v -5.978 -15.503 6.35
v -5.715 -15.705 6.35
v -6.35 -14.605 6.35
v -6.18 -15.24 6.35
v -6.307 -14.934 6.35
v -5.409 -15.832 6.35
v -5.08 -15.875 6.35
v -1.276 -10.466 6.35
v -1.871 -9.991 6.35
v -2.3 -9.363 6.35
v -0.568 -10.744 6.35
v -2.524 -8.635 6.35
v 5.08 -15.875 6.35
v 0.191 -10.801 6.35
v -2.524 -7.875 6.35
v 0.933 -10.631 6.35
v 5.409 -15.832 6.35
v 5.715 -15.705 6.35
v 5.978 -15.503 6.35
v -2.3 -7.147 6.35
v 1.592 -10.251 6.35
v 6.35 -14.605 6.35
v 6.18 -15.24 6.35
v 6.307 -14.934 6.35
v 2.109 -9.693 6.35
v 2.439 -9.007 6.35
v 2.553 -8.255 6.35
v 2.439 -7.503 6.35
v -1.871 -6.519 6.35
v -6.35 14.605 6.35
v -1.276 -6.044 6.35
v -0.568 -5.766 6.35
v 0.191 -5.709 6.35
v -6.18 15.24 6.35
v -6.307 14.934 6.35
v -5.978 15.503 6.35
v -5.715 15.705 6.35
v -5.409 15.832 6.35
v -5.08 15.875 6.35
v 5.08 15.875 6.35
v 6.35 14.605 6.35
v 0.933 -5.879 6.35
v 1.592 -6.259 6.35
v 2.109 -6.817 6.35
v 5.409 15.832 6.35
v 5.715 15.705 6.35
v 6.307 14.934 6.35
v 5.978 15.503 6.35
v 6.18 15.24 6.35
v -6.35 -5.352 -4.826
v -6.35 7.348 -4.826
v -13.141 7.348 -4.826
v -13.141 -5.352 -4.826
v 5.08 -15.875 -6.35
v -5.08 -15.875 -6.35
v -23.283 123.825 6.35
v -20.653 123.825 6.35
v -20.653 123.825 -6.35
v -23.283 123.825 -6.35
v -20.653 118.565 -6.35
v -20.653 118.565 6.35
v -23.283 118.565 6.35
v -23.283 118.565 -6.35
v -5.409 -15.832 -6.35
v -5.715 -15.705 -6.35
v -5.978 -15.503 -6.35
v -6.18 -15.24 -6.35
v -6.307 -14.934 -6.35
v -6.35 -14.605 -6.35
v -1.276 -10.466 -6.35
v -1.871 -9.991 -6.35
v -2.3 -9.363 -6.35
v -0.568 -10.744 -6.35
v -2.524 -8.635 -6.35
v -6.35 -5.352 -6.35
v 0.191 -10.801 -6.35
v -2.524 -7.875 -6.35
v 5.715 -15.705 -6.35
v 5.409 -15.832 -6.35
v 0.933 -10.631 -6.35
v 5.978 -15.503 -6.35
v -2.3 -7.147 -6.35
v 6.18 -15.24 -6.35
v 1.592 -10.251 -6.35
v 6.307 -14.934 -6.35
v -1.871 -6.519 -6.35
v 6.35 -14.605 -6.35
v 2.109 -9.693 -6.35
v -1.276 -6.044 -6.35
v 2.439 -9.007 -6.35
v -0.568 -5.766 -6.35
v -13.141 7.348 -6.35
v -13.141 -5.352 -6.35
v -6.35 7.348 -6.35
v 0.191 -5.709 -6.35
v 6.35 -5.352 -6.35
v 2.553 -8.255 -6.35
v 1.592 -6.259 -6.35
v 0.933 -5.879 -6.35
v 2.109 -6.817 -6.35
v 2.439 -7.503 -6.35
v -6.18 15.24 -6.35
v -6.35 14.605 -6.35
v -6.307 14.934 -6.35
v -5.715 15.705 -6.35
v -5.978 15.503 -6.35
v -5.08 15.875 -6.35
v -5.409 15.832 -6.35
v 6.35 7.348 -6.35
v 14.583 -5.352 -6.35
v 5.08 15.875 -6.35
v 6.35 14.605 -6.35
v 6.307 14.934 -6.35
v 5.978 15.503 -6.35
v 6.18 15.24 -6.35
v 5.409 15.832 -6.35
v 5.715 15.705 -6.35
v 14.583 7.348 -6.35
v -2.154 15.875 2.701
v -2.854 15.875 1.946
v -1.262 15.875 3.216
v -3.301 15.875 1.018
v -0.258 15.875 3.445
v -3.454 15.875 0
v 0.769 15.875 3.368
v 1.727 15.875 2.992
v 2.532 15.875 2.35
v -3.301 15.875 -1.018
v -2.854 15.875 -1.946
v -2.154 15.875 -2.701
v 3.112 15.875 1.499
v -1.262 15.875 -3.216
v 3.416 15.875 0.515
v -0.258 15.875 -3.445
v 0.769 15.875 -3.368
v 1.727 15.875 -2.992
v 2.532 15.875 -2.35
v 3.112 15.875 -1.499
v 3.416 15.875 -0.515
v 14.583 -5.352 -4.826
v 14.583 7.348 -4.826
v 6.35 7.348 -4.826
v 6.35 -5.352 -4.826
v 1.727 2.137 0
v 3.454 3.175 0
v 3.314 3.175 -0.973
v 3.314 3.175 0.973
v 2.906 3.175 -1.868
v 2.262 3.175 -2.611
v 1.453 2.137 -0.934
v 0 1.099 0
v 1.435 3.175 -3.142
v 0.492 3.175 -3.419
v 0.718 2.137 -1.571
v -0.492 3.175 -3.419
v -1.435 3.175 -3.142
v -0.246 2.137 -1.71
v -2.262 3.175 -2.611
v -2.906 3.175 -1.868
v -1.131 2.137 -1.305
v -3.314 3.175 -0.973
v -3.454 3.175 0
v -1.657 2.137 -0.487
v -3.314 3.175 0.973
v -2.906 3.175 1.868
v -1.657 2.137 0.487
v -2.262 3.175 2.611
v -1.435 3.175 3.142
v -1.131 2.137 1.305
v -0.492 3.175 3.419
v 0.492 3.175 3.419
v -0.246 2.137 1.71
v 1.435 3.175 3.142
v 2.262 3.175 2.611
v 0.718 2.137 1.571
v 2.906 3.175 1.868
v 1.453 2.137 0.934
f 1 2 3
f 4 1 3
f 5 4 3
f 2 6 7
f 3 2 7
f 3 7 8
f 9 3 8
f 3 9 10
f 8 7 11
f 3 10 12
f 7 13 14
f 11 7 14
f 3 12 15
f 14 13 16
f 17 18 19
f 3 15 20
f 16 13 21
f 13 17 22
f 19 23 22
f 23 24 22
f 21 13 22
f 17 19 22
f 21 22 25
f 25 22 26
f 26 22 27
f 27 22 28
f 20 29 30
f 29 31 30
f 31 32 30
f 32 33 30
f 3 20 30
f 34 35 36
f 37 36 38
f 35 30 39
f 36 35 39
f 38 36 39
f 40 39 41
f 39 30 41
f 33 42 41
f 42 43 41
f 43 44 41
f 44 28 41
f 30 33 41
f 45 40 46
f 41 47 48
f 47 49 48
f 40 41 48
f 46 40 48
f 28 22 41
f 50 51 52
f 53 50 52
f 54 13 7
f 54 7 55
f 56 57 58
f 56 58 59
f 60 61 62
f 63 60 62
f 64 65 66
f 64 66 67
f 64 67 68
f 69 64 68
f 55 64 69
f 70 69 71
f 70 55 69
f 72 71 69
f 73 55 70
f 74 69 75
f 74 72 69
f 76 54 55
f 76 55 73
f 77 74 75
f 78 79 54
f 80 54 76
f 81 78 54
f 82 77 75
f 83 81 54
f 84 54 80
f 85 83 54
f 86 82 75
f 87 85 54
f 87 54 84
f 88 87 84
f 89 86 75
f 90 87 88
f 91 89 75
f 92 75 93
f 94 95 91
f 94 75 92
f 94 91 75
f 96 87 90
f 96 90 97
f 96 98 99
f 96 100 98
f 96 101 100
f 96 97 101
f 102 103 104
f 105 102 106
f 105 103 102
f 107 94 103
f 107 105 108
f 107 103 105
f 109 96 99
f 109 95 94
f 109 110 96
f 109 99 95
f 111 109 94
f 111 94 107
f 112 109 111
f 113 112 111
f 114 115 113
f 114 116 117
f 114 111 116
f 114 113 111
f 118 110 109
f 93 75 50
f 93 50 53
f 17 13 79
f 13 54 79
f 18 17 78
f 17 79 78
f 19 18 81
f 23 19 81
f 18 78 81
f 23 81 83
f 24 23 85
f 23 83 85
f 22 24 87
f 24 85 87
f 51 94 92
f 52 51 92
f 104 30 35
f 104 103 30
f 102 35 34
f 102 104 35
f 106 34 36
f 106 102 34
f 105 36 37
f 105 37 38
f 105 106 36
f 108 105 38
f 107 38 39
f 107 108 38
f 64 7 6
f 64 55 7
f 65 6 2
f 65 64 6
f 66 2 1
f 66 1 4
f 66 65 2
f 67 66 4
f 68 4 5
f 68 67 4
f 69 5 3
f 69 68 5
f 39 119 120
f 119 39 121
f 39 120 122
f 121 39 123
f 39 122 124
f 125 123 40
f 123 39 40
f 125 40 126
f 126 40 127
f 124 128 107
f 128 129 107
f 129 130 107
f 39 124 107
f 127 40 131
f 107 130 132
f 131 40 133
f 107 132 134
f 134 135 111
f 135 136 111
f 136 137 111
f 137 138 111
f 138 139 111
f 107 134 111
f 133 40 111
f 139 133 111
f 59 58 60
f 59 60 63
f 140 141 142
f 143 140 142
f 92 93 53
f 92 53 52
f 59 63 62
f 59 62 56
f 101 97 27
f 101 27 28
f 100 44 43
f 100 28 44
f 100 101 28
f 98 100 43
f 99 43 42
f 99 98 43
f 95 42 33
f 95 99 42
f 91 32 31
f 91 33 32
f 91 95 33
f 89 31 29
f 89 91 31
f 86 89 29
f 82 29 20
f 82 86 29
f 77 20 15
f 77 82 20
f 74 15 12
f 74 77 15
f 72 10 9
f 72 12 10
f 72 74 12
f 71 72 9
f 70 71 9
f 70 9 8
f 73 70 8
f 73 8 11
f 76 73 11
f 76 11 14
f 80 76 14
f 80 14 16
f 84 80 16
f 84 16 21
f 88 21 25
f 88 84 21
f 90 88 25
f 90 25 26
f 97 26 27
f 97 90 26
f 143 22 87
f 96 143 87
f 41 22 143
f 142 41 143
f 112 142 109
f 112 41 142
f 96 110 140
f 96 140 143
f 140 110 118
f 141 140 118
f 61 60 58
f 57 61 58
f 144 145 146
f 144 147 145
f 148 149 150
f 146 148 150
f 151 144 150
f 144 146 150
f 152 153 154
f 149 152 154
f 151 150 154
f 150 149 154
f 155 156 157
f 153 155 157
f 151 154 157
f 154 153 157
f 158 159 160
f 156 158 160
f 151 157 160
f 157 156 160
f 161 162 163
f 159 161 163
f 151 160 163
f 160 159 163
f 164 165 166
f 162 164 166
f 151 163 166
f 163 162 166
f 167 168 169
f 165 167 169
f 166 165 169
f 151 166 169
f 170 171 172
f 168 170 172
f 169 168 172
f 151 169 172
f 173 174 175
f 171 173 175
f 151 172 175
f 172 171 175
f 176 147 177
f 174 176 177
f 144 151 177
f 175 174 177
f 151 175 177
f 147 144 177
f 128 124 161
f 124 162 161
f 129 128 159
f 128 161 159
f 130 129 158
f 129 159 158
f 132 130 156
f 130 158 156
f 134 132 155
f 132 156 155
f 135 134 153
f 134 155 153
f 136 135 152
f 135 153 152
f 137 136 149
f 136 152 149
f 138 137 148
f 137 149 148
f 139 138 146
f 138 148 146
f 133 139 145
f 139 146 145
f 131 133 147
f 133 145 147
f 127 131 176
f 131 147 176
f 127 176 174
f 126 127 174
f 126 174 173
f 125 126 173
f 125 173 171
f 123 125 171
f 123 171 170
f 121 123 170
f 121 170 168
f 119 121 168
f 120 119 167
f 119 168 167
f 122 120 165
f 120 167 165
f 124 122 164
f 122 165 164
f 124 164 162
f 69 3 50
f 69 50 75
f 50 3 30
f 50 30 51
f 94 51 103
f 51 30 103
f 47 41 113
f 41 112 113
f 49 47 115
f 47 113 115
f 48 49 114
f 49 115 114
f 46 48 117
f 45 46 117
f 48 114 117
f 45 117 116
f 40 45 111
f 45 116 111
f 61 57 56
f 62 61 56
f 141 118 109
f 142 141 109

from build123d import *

# Parameters (mm, degrees)
SKETCH1_W                    = 12.7
SKETCH1_H                    = 31.75
BOSS_EXTRUDE1_DEPTH          = 6.35
F_5_16_24_TAPPED_HOLE1_D     = 6.9088
F_5_16_24_TAPPED_HOLE1_DEPTH = 12.7
F_5_16_24_TAPPED_HOLE1_TIP   = 2.075612922
CUT_EXTRUDE1_DEPTH           = 22.298547486
CUT_EXTRUDE1_DEPTH_BACK      = 22.298547486
SKETCH8_R                    = 2.5527
SKETCH13_W                   = 2.629886975
SKETCH13_H                   = 5.259773951
BOSS_EXTRUDE2_DEPTH          = 12.7
SKETCH14_W                   = 6.790912291
SKETCH14_H                   = 12.7
SKETCH14_W_2                 = 8.232513551
BOSS_EXTRUDE3_DEPTH          = 1.524
FILLET1_R                    = 1.27


with BuildPart() as part:
    # Sketch1 → Boss-Extrude1 (new, symmetric)
    with BuildSketch(Plane(origin=(0, 0, 0), x_dir=(0, 0, -1), z_dir=(1, 0, 0))):
        Rectangle(SKETCH1_W, SKETCH1_H)
    extrude(amount=BOSS_EXTRUDE1_DEPTH, both=True)

    # 5/16-24 Tapped Hole1
    with Locations(Plane(origin=(0, 15.875, 0), x_dir=(1, 0, 0), z_dir=(0, 1, 0))):
        with Locations((0, 0)):
            Hole(F_5_16_24_TAPPED_HOLE1_D / 2, depth=F_5_16_24_TAPPED_HOLE1_DEPTH)
            with Locations((0, 0, -(F_5_16_24_TAPPED_HOLE1_DEPTH + F_5_16_24_TAPPED_HOLE1_TIP / 2))):  # 118° drill point
                Cone(0, F_5_16_24_TAPPED_HOLE1_D / 2, F_5_16_24_TAPPED_HOLE1_TIP, mode=Mode.SUBTRACT)

    # Sketch8 → Cut-Extrude1 (cut, two sides: drawn at the far end of the back side and taken through both)
    with BuildSketch(Plane.XY.offset(6.35).offset(-CUT_EXTRUDE1_DEPTH_BACK)):
        with Locations((0, -8.255)):
            Circle(SKETCH8_R)
    extrude(amount=CUT_EXTRUDE1_DEPTH + CUT_EXTRUDE1_DEPTH_BACK, mode=Mode.SUBTRACT)

    # Sketch14 → Boss-Extrude3 (add)
    with BuildSketch(Plane(origin=(0, 0, -6.35), x_dir=(-1, 0, 0), z_dir=(0, 0, -1))):
        with Locations((9.745456146, 0.998266939)):
            Rectangle(SKETCH14_W, SKETCH14_H)
        with Locations((-10.466256776, 0.998266939)):
            Rectangle(SKETCH14_W_2, SKETCH14_H)
    extrude(amount=-BOSS_EXTRUDE3_DEPTH)

    # Fillet1
    fillet1_edges = [part.edges().sort_by_distance(p)[0] for p in [
        (6.35, -15.875, 0),
        (-6.35, -15.875, 0),
        (-6.35, 15.875, 0),
        (6.35, 15.875, 0),
    ]]
    fillet(fillet1_edges, radius=FILLET1_R)


with BuildPart() as body_2:
    # Sketch13 → Boss-Extrude2 (new body)
    with BuildSketch(Plane(origin=(0, 0, -6.35), x_dir=(-1, 0, 0), z_dir=(0, 0, -1))):
        with Locations((21.968389845, 121.195113025)):
            Rectangle(SKETCH13_W, SKETCH13_H)
    extrude(amount=-BOSS_EXTRUDE2_DEPTH)


solid = Compound([part.part, body_2.part])
